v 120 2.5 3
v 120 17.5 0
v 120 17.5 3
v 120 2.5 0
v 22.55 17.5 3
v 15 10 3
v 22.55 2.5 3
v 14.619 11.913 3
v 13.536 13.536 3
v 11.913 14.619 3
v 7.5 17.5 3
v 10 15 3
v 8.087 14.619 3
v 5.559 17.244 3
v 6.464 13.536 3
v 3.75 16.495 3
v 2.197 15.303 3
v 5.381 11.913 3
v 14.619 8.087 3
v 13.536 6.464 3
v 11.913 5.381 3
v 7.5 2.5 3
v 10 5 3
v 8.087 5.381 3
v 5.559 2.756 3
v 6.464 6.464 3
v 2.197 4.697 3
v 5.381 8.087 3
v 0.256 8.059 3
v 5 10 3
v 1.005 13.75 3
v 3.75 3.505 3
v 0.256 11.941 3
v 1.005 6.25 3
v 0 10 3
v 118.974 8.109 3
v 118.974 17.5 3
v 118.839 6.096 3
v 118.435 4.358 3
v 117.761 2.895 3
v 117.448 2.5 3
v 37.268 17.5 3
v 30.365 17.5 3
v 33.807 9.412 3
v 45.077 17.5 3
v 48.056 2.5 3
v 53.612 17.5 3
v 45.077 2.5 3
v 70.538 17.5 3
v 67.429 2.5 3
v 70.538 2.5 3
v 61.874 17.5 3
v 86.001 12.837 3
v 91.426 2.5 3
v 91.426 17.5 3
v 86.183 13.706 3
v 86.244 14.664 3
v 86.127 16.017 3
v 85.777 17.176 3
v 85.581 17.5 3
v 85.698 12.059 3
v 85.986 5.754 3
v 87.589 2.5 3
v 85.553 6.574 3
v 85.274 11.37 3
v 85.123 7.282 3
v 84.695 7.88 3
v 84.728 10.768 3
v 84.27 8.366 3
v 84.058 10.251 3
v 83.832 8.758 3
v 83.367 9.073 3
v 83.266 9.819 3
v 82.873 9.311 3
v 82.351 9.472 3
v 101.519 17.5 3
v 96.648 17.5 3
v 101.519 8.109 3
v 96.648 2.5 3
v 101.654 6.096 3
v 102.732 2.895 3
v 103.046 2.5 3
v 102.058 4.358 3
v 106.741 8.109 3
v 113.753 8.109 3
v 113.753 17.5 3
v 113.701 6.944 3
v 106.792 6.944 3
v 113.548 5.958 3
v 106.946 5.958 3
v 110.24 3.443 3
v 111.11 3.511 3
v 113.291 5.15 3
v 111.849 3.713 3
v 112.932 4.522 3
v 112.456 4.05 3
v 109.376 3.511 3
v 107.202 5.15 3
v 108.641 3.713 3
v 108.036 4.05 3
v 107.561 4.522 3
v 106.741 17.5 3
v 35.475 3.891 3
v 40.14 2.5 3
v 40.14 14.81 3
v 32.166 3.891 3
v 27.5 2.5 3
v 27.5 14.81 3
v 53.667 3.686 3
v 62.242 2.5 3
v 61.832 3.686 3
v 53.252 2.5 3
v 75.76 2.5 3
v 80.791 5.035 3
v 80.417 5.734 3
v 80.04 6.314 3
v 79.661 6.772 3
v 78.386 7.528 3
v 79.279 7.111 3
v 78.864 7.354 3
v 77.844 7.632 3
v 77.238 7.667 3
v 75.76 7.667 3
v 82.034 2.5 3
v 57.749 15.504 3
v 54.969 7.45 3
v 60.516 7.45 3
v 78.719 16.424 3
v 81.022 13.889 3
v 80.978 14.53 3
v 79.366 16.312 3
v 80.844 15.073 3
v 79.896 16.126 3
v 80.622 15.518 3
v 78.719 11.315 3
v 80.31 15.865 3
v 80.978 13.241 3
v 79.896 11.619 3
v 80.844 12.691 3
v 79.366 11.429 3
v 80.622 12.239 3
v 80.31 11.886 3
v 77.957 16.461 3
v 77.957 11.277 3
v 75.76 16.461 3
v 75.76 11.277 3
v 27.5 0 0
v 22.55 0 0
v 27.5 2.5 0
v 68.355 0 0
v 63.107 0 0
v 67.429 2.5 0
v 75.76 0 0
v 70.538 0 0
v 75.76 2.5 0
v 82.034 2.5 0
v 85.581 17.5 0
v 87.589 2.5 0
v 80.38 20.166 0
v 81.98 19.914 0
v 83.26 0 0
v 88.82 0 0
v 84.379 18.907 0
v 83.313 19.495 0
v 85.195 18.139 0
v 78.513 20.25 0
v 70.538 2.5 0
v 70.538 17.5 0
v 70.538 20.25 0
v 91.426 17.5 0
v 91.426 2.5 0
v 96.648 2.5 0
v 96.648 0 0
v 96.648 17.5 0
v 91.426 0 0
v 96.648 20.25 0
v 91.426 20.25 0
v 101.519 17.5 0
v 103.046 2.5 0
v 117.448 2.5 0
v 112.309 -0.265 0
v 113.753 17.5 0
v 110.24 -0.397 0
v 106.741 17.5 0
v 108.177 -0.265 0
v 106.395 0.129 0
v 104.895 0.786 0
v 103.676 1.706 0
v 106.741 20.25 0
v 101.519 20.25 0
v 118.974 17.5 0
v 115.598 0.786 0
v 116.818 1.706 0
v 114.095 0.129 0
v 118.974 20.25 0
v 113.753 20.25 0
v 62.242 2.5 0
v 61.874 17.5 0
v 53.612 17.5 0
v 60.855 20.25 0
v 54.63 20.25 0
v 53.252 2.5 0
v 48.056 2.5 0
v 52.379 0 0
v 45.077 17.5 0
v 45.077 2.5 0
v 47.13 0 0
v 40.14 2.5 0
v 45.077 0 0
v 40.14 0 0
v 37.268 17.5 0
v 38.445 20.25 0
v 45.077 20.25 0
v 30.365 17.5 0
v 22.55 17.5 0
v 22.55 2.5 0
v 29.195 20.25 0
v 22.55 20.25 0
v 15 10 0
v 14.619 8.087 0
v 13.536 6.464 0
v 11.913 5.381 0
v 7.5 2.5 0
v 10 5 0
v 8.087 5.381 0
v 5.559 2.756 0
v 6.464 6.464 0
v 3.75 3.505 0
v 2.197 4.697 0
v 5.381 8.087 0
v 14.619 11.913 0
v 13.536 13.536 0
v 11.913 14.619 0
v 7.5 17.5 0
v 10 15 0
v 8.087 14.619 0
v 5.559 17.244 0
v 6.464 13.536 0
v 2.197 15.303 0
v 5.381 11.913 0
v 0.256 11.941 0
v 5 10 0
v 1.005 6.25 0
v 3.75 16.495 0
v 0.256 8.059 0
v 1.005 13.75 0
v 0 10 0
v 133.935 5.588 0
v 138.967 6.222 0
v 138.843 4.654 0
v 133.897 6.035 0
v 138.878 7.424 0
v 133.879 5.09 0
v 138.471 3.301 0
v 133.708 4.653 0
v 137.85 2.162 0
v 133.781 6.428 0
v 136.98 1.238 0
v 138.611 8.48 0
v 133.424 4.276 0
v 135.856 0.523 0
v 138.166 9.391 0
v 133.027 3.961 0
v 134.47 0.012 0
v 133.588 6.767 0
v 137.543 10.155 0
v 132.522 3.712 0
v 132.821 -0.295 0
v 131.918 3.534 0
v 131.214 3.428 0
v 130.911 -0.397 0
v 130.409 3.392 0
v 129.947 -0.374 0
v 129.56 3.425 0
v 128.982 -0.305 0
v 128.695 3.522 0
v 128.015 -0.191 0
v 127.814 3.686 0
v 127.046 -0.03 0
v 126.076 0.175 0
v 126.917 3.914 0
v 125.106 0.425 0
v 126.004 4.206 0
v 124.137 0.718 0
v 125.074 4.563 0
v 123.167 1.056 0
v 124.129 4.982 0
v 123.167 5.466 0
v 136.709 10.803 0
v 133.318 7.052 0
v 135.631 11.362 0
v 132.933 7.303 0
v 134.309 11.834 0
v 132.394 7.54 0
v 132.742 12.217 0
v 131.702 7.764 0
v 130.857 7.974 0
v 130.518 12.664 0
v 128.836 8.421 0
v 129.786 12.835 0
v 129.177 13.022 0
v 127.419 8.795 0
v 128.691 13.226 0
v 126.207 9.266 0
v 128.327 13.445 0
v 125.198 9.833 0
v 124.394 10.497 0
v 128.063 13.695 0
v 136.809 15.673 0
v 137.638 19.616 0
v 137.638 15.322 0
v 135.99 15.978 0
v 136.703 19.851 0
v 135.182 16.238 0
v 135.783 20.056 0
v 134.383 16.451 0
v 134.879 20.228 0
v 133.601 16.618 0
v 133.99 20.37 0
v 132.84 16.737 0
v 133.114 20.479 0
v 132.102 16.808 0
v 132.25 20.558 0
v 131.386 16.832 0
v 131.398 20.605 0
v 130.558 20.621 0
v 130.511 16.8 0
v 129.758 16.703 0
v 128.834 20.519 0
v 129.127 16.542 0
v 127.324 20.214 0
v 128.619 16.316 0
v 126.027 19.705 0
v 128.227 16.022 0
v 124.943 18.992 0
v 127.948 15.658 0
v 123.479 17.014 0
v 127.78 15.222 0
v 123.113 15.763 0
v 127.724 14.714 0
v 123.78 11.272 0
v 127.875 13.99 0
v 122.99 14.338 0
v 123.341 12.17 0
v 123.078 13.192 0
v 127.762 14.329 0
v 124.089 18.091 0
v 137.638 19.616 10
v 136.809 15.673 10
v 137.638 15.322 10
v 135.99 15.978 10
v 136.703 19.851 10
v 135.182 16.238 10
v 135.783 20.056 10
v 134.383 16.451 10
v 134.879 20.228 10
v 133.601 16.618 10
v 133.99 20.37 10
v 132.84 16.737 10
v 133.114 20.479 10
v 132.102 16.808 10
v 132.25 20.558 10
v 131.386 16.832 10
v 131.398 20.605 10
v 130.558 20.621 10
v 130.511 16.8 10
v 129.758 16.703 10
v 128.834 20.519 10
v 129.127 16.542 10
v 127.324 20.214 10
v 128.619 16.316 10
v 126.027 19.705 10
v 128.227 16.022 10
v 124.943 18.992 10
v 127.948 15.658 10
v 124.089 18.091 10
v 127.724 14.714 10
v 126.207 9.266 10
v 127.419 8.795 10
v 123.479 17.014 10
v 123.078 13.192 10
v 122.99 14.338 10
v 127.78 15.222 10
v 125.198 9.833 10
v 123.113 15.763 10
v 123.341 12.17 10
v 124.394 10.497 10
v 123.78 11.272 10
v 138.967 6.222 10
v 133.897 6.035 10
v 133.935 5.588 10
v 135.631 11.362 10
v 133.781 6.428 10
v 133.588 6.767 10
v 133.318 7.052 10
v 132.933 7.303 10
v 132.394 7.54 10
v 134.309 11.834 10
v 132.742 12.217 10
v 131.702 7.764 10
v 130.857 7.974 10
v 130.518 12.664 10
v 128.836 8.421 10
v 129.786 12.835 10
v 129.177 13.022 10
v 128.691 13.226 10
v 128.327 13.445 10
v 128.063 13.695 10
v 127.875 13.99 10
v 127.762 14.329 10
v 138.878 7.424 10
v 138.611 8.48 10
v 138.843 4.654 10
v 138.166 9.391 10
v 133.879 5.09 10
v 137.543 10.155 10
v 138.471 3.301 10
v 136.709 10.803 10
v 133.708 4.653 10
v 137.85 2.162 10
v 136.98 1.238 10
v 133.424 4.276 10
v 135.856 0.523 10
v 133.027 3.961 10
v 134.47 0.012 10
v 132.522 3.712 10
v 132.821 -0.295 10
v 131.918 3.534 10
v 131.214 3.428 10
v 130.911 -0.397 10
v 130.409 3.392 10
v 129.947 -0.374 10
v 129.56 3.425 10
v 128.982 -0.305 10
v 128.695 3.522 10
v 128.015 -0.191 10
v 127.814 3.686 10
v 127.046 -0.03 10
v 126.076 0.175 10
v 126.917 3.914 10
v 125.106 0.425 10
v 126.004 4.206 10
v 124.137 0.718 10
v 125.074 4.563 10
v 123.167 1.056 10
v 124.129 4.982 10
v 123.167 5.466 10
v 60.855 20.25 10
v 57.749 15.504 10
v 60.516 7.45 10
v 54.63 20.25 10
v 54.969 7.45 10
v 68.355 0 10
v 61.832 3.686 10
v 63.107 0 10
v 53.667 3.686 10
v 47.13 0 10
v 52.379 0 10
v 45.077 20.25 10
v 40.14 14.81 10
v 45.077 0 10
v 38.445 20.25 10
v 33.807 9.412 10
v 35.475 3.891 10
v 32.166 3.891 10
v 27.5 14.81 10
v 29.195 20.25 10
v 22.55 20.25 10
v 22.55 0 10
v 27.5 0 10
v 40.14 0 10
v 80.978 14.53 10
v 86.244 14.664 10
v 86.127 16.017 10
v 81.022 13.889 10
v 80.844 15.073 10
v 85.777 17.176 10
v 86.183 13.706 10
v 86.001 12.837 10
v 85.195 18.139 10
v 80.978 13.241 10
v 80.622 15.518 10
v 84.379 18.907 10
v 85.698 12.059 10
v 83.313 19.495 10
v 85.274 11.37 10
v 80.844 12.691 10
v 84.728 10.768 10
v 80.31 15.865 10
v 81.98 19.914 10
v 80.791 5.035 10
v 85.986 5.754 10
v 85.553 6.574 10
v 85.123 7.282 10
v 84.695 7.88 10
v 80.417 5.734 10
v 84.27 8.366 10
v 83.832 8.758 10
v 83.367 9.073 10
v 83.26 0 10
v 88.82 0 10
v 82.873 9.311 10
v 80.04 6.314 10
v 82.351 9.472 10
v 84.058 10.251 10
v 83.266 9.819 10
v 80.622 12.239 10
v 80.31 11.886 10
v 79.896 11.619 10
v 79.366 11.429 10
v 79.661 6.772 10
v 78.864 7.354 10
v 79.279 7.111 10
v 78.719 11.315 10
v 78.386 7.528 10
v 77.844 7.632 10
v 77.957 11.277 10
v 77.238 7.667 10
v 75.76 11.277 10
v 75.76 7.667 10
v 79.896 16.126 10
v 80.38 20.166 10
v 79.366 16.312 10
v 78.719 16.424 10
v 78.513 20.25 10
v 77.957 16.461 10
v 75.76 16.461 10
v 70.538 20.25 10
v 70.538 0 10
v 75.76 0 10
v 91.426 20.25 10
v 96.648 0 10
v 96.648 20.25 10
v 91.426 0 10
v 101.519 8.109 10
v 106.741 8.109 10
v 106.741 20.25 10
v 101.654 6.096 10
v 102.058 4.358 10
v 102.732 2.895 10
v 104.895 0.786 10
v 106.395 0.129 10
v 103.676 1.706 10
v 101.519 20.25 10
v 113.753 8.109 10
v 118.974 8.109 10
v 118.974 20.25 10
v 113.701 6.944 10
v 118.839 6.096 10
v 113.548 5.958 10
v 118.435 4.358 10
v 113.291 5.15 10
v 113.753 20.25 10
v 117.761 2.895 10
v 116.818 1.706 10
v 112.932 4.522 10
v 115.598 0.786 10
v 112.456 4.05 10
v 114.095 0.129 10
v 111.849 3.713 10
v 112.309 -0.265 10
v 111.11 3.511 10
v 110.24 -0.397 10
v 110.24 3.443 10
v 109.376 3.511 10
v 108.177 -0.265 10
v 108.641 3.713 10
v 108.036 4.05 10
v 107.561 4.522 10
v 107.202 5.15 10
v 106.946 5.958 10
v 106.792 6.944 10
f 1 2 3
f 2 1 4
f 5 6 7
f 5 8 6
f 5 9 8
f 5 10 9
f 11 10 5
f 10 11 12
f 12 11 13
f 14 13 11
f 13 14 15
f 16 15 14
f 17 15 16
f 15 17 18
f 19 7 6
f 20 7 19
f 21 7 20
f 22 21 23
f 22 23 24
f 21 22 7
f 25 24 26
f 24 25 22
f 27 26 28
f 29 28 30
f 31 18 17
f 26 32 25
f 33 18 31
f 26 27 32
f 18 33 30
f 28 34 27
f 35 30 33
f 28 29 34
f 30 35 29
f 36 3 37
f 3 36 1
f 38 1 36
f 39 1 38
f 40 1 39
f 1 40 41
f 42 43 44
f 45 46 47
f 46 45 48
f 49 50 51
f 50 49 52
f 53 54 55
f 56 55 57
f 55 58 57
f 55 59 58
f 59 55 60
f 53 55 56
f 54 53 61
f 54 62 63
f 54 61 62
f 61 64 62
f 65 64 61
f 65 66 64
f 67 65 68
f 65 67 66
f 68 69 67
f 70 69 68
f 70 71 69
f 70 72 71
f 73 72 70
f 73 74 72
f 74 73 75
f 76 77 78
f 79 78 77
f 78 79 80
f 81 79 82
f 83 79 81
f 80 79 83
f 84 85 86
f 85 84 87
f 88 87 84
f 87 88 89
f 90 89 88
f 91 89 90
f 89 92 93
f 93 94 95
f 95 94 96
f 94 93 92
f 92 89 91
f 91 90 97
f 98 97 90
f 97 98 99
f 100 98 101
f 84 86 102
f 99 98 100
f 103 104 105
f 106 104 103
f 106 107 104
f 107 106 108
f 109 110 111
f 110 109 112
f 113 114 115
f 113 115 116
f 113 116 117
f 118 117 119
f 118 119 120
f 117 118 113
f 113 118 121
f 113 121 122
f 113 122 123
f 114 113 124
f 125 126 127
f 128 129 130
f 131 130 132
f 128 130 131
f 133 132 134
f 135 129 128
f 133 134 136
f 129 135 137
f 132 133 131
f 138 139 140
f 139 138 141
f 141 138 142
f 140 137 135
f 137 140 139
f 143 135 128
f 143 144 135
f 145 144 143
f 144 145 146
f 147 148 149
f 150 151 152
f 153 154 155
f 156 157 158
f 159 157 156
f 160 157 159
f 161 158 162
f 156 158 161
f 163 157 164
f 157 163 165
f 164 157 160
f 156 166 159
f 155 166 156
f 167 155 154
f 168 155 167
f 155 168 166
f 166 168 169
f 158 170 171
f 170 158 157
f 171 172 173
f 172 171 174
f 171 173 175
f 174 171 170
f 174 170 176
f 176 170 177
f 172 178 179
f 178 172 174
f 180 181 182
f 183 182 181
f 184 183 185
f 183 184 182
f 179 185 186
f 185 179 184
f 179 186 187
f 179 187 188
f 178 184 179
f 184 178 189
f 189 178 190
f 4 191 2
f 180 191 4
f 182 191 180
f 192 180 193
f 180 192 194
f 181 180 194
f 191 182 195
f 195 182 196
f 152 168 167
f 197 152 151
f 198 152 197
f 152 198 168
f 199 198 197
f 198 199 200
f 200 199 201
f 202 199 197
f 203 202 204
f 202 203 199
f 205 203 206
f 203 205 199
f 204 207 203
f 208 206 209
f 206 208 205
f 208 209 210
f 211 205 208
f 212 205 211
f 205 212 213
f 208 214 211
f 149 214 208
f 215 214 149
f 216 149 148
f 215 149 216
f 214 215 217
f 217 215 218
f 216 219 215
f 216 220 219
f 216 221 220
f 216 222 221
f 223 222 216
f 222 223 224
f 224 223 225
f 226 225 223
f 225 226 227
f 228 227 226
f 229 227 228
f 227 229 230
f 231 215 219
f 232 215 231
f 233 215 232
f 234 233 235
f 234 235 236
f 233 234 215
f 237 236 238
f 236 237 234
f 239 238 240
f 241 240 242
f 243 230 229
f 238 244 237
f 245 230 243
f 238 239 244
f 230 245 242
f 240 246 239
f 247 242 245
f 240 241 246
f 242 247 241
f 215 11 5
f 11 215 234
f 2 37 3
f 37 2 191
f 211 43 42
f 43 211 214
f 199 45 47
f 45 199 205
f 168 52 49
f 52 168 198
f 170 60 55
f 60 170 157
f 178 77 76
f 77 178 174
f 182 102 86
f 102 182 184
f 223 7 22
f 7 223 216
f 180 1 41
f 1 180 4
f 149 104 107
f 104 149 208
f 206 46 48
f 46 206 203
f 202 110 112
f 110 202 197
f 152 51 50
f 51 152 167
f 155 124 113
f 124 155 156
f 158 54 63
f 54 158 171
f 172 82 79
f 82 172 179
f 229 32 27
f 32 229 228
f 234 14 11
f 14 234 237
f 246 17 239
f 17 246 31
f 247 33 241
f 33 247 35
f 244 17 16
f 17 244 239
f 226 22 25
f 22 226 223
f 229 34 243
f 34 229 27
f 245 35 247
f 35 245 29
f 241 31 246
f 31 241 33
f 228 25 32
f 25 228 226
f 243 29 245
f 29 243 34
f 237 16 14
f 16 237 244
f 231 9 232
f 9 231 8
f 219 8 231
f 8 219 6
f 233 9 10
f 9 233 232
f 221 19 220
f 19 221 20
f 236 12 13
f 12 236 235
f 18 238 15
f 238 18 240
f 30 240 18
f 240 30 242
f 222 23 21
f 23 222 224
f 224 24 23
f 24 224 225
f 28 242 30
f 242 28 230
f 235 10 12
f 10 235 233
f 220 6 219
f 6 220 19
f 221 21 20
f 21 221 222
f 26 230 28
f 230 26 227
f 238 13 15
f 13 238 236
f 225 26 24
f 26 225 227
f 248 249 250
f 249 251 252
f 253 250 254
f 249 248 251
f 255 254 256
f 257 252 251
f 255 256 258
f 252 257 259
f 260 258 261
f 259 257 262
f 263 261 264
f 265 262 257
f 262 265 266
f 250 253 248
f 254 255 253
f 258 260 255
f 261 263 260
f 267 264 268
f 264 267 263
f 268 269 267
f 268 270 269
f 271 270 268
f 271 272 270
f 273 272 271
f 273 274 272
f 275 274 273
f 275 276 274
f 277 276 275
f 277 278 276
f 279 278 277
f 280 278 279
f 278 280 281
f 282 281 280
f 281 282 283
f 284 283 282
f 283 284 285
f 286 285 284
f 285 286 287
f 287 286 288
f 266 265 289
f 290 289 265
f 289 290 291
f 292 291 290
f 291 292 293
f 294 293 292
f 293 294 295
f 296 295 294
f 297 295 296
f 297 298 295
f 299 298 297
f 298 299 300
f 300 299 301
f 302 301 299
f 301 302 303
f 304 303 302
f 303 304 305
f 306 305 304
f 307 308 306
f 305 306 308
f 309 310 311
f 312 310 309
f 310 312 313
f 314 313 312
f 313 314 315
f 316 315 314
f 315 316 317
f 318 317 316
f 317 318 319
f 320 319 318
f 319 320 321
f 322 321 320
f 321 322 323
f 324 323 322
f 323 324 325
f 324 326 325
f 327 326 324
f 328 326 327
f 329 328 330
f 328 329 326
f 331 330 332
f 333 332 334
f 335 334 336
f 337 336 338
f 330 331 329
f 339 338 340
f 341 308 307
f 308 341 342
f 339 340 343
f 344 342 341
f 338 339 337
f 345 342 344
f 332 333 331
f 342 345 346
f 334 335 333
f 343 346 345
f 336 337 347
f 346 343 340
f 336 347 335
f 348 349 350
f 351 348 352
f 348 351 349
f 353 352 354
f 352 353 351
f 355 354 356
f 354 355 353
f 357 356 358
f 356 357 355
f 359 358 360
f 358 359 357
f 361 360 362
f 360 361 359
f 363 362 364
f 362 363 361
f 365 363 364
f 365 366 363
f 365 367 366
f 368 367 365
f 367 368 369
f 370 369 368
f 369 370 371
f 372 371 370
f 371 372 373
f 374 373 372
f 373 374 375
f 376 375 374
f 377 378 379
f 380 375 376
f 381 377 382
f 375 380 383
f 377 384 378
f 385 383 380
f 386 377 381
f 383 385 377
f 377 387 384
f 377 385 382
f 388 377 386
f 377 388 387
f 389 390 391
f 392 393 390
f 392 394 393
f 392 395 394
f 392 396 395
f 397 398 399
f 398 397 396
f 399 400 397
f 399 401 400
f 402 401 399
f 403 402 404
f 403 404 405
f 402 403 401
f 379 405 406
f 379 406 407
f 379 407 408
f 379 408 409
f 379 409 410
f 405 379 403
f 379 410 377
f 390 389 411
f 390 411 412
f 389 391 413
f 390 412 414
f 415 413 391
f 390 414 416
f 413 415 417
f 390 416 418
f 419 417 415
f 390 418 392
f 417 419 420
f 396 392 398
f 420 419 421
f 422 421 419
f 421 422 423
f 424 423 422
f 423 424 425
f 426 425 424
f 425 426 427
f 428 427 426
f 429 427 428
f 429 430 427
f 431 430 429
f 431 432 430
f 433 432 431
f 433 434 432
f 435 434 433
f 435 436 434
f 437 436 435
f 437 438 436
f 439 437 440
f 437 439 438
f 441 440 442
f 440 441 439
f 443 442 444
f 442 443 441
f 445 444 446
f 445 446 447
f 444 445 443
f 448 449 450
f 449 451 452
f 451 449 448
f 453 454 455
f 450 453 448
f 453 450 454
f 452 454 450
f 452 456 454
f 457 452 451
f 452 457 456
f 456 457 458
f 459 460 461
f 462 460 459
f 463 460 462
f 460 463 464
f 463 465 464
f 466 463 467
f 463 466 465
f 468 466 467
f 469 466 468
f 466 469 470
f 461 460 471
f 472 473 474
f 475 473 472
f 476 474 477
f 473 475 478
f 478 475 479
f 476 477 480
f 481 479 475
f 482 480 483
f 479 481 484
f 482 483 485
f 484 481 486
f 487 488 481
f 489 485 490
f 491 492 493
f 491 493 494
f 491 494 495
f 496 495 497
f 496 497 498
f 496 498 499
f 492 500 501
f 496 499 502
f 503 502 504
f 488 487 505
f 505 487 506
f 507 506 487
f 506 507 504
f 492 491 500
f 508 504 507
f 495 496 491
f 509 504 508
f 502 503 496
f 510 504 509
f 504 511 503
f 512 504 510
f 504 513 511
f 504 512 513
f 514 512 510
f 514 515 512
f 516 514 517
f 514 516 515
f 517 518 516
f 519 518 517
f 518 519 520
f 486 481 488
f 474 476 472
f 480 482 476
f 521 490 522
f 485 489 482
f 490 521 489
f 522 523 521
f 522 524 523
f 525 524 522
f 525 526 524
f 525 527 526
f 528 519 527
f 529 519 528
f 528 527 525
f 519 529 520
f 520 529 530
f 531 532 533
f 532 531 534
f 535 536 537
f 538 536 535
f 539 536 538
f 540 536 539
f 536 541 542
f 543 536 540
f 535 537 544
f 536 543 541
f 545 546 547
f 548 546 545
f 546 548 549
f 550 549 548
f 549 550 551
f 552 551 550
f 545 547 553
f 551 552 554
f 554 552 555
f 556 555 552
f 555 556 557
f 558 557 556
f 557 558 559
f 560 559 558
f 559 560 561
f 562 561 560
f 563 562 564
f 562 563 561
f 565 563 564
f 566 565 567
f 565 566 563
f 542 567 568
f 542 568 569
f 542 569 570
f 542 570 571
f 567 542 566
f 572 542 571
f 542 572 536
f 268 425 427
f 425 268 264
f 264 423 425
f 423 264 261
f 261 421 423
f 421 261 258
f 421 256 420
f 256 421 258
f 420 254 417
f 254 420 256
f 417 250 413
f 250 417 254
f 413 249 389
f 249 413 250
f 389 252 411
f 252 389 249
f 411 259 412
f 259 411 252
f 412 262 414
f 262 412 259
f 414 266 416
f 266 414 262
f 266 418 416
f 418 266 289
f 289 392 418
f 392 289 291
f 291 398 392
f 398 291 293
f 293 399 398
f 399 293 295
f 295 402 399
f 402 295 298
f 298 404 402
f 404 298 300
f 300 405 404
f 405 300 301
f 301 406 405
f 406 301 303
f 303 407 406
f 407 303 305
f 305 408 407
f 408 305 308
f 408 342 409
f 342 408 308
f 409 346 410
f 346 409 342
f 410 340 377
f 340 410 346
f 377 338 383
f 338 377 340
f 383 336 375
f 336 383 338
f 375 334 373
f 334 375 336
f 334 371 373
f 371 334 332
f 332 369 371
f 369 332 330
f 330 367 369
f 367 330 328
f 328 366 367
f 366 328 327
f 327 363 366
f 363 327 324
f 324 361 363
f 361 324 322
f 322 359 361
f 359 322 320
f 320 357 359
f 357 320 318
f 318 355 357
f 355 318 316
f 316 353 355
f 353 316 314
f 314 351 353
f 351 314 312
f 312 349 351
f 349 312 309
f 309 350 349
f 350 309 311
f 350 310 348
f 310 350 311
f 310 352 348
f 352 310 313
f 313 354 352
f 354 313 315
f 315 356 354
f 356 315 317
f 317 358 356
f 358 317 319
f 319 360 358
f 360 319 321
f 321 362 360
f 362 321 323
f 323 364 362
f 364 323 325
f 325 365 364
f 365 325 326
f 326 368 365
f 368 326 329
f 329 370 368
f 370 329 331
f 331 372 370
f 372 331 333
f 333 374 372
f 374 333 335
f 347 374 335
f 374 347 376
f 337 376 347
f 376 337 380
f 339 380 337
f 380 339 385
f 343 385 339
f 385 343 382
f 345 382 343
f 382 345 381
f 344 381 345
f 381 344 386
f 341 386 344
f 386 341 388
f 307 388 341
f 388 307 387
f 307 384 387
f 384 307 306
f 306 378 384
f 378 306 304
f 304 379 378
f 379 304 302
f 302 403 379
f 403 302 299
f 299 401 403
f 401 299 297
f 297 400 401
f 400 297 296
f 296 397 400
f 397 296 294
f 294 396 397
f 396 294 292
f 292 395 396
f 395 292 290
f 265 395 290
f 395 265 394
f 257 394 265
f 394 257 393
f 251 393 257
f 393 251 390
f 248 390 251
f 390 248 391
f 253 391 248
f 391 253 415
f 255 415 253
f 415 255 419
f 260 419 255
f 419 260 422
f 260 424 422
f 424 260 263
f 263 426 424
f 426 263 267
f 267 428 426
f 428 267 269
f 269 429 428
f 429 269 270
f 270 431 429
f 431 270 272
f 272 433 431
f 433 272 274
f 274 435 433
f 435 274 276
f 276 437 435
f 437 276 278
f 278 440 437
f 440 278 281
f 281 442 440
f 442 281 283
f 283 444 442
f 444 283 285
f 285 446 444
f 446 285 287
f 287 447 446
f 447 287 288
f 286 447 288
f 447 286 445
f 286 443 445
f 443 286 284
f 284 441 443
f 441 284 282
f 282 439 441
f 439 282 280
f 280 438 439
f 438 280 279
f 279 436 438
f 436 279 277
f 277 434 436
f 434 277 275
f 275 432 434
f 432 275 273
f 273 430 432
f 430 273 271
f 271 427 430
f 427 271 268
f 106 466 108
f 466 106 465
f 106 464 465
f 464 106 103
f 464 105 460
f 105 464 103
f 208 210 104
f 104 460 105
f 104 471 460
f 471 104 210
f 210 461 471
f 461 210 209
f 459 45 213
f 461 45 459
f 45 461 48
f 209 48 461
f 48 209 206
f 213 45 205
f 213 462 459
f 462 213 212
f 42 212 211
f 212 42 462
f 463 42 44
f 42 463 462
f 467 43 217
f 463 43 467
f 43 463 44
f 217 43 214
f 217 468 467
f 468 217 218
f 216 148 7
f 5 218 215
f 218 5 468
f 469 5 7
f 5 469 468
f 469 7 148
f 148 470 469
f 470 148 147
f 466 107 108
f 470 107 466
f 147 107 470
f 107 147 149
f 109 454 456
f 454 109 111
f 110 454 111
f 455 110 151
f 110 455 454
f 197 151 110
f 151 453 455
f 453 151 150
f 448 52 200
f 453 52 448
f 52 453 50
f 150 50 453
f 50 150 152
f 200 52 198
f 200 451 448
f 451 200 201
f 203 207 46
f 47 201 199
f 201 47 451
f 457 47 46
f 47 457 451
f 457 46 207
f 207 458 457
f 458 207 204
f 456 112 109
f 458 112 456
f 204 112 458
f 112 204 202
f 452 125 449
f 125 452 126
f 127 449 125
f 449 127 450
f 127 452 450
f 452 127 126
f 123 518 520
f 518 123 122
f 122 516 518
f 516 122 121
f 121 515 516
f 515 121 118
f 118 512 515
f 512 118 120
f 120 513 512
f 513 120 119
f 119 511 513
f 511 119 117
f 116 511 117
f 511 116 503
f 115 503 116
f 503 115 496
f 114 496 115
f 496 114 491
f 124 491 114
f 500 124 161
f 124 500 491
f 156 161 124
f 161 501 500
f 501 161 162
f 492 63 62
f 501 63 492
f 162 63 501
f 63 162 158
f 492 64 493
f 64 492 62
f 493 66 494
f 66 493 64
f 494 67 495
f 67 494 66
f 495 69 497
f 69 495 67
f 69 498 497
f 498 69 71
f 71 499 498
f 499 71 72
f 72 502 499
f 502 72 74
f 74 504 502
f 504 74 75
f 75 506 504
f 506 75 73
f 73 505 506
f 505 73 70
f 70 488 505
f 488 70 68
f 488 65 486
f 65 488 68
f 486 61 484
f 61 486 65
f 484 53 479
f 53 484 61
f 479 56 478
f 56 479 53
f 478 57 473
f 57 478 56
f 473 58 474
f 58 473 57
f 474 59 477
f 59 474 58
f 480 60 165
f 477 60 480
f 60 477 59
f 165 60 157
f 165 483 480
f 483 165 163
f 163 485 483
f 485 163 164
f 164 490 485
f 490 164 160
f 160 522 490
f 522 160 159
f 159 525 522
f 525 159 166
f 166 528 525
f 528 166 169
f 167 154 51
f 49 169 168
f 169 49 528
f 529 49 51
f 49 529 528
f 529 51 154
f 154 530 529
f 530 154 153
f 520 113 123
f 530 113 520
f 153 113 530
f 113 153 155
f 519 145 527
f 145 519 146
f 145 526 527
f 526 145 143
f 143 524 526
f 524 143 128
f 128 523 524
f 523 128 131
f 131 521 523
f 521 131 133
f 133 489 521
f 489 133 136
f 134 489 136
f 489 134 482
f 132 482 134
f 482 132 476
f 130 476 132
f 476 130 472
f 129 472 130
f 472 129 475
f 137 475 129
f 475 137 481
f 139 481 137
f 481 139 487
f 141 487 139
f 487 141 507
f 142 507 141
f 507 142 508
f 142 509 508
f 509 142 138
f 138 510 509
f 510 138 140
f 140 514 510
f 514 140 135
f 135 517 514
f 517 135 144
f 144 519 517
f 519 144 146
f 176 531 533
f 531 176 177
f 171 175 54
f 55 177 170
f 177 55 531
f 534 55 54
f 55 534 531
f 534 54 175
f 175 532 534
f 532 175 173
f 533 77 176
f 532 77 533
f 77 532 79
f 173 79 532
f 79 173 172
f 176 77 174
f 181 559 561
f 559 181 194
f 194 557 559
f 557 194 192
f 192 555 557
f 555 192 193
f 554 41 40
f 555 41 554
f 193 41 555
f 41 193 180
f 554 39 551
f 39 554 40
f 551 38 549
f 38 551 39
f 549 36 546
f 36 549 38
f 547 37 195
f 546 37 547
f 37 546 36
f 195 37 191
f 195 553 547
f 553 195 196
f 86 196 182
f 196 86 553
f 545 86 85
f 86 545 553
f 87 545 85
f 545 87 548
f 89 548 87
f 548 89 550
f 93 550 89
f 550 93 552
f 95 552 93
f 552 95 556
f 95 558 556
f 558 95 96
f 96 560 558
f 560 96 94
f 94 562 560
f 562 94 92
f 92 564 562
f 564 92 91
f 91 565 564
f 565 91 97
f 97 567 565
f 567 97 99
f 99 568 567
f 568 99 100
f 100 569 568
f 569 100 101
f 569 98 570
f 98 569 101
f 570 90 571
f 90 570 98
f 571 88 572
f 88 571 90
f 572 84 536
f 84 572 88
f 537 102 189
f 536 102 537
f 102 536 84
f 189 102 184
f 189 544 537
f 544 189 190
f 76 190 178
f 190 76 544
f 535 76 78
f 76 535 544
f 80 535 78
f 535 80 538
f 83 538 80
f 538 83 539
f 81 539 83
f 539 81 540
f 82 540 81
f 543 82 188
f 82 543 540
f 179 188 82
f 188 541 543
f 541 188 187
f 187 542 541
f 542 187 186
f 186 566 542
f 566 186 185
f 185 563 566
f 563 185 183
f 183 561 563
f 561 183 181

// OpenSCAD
translate([20, 0, 0]) {
    linear_extrude(height=10) {
        text("MARIUS", size=20, font="Noteworthy:style=Bold");
    }
}

difference() {
    union() {
        translate([7.5, 2.5, 0]) cube([120 - 7.5, 15,3]);
        translate([7.5, 10, 0]) cylinder(d=15, h=3);
    }
    translate([10, 10, -1]) cylinder(h=20, d=10);
}
